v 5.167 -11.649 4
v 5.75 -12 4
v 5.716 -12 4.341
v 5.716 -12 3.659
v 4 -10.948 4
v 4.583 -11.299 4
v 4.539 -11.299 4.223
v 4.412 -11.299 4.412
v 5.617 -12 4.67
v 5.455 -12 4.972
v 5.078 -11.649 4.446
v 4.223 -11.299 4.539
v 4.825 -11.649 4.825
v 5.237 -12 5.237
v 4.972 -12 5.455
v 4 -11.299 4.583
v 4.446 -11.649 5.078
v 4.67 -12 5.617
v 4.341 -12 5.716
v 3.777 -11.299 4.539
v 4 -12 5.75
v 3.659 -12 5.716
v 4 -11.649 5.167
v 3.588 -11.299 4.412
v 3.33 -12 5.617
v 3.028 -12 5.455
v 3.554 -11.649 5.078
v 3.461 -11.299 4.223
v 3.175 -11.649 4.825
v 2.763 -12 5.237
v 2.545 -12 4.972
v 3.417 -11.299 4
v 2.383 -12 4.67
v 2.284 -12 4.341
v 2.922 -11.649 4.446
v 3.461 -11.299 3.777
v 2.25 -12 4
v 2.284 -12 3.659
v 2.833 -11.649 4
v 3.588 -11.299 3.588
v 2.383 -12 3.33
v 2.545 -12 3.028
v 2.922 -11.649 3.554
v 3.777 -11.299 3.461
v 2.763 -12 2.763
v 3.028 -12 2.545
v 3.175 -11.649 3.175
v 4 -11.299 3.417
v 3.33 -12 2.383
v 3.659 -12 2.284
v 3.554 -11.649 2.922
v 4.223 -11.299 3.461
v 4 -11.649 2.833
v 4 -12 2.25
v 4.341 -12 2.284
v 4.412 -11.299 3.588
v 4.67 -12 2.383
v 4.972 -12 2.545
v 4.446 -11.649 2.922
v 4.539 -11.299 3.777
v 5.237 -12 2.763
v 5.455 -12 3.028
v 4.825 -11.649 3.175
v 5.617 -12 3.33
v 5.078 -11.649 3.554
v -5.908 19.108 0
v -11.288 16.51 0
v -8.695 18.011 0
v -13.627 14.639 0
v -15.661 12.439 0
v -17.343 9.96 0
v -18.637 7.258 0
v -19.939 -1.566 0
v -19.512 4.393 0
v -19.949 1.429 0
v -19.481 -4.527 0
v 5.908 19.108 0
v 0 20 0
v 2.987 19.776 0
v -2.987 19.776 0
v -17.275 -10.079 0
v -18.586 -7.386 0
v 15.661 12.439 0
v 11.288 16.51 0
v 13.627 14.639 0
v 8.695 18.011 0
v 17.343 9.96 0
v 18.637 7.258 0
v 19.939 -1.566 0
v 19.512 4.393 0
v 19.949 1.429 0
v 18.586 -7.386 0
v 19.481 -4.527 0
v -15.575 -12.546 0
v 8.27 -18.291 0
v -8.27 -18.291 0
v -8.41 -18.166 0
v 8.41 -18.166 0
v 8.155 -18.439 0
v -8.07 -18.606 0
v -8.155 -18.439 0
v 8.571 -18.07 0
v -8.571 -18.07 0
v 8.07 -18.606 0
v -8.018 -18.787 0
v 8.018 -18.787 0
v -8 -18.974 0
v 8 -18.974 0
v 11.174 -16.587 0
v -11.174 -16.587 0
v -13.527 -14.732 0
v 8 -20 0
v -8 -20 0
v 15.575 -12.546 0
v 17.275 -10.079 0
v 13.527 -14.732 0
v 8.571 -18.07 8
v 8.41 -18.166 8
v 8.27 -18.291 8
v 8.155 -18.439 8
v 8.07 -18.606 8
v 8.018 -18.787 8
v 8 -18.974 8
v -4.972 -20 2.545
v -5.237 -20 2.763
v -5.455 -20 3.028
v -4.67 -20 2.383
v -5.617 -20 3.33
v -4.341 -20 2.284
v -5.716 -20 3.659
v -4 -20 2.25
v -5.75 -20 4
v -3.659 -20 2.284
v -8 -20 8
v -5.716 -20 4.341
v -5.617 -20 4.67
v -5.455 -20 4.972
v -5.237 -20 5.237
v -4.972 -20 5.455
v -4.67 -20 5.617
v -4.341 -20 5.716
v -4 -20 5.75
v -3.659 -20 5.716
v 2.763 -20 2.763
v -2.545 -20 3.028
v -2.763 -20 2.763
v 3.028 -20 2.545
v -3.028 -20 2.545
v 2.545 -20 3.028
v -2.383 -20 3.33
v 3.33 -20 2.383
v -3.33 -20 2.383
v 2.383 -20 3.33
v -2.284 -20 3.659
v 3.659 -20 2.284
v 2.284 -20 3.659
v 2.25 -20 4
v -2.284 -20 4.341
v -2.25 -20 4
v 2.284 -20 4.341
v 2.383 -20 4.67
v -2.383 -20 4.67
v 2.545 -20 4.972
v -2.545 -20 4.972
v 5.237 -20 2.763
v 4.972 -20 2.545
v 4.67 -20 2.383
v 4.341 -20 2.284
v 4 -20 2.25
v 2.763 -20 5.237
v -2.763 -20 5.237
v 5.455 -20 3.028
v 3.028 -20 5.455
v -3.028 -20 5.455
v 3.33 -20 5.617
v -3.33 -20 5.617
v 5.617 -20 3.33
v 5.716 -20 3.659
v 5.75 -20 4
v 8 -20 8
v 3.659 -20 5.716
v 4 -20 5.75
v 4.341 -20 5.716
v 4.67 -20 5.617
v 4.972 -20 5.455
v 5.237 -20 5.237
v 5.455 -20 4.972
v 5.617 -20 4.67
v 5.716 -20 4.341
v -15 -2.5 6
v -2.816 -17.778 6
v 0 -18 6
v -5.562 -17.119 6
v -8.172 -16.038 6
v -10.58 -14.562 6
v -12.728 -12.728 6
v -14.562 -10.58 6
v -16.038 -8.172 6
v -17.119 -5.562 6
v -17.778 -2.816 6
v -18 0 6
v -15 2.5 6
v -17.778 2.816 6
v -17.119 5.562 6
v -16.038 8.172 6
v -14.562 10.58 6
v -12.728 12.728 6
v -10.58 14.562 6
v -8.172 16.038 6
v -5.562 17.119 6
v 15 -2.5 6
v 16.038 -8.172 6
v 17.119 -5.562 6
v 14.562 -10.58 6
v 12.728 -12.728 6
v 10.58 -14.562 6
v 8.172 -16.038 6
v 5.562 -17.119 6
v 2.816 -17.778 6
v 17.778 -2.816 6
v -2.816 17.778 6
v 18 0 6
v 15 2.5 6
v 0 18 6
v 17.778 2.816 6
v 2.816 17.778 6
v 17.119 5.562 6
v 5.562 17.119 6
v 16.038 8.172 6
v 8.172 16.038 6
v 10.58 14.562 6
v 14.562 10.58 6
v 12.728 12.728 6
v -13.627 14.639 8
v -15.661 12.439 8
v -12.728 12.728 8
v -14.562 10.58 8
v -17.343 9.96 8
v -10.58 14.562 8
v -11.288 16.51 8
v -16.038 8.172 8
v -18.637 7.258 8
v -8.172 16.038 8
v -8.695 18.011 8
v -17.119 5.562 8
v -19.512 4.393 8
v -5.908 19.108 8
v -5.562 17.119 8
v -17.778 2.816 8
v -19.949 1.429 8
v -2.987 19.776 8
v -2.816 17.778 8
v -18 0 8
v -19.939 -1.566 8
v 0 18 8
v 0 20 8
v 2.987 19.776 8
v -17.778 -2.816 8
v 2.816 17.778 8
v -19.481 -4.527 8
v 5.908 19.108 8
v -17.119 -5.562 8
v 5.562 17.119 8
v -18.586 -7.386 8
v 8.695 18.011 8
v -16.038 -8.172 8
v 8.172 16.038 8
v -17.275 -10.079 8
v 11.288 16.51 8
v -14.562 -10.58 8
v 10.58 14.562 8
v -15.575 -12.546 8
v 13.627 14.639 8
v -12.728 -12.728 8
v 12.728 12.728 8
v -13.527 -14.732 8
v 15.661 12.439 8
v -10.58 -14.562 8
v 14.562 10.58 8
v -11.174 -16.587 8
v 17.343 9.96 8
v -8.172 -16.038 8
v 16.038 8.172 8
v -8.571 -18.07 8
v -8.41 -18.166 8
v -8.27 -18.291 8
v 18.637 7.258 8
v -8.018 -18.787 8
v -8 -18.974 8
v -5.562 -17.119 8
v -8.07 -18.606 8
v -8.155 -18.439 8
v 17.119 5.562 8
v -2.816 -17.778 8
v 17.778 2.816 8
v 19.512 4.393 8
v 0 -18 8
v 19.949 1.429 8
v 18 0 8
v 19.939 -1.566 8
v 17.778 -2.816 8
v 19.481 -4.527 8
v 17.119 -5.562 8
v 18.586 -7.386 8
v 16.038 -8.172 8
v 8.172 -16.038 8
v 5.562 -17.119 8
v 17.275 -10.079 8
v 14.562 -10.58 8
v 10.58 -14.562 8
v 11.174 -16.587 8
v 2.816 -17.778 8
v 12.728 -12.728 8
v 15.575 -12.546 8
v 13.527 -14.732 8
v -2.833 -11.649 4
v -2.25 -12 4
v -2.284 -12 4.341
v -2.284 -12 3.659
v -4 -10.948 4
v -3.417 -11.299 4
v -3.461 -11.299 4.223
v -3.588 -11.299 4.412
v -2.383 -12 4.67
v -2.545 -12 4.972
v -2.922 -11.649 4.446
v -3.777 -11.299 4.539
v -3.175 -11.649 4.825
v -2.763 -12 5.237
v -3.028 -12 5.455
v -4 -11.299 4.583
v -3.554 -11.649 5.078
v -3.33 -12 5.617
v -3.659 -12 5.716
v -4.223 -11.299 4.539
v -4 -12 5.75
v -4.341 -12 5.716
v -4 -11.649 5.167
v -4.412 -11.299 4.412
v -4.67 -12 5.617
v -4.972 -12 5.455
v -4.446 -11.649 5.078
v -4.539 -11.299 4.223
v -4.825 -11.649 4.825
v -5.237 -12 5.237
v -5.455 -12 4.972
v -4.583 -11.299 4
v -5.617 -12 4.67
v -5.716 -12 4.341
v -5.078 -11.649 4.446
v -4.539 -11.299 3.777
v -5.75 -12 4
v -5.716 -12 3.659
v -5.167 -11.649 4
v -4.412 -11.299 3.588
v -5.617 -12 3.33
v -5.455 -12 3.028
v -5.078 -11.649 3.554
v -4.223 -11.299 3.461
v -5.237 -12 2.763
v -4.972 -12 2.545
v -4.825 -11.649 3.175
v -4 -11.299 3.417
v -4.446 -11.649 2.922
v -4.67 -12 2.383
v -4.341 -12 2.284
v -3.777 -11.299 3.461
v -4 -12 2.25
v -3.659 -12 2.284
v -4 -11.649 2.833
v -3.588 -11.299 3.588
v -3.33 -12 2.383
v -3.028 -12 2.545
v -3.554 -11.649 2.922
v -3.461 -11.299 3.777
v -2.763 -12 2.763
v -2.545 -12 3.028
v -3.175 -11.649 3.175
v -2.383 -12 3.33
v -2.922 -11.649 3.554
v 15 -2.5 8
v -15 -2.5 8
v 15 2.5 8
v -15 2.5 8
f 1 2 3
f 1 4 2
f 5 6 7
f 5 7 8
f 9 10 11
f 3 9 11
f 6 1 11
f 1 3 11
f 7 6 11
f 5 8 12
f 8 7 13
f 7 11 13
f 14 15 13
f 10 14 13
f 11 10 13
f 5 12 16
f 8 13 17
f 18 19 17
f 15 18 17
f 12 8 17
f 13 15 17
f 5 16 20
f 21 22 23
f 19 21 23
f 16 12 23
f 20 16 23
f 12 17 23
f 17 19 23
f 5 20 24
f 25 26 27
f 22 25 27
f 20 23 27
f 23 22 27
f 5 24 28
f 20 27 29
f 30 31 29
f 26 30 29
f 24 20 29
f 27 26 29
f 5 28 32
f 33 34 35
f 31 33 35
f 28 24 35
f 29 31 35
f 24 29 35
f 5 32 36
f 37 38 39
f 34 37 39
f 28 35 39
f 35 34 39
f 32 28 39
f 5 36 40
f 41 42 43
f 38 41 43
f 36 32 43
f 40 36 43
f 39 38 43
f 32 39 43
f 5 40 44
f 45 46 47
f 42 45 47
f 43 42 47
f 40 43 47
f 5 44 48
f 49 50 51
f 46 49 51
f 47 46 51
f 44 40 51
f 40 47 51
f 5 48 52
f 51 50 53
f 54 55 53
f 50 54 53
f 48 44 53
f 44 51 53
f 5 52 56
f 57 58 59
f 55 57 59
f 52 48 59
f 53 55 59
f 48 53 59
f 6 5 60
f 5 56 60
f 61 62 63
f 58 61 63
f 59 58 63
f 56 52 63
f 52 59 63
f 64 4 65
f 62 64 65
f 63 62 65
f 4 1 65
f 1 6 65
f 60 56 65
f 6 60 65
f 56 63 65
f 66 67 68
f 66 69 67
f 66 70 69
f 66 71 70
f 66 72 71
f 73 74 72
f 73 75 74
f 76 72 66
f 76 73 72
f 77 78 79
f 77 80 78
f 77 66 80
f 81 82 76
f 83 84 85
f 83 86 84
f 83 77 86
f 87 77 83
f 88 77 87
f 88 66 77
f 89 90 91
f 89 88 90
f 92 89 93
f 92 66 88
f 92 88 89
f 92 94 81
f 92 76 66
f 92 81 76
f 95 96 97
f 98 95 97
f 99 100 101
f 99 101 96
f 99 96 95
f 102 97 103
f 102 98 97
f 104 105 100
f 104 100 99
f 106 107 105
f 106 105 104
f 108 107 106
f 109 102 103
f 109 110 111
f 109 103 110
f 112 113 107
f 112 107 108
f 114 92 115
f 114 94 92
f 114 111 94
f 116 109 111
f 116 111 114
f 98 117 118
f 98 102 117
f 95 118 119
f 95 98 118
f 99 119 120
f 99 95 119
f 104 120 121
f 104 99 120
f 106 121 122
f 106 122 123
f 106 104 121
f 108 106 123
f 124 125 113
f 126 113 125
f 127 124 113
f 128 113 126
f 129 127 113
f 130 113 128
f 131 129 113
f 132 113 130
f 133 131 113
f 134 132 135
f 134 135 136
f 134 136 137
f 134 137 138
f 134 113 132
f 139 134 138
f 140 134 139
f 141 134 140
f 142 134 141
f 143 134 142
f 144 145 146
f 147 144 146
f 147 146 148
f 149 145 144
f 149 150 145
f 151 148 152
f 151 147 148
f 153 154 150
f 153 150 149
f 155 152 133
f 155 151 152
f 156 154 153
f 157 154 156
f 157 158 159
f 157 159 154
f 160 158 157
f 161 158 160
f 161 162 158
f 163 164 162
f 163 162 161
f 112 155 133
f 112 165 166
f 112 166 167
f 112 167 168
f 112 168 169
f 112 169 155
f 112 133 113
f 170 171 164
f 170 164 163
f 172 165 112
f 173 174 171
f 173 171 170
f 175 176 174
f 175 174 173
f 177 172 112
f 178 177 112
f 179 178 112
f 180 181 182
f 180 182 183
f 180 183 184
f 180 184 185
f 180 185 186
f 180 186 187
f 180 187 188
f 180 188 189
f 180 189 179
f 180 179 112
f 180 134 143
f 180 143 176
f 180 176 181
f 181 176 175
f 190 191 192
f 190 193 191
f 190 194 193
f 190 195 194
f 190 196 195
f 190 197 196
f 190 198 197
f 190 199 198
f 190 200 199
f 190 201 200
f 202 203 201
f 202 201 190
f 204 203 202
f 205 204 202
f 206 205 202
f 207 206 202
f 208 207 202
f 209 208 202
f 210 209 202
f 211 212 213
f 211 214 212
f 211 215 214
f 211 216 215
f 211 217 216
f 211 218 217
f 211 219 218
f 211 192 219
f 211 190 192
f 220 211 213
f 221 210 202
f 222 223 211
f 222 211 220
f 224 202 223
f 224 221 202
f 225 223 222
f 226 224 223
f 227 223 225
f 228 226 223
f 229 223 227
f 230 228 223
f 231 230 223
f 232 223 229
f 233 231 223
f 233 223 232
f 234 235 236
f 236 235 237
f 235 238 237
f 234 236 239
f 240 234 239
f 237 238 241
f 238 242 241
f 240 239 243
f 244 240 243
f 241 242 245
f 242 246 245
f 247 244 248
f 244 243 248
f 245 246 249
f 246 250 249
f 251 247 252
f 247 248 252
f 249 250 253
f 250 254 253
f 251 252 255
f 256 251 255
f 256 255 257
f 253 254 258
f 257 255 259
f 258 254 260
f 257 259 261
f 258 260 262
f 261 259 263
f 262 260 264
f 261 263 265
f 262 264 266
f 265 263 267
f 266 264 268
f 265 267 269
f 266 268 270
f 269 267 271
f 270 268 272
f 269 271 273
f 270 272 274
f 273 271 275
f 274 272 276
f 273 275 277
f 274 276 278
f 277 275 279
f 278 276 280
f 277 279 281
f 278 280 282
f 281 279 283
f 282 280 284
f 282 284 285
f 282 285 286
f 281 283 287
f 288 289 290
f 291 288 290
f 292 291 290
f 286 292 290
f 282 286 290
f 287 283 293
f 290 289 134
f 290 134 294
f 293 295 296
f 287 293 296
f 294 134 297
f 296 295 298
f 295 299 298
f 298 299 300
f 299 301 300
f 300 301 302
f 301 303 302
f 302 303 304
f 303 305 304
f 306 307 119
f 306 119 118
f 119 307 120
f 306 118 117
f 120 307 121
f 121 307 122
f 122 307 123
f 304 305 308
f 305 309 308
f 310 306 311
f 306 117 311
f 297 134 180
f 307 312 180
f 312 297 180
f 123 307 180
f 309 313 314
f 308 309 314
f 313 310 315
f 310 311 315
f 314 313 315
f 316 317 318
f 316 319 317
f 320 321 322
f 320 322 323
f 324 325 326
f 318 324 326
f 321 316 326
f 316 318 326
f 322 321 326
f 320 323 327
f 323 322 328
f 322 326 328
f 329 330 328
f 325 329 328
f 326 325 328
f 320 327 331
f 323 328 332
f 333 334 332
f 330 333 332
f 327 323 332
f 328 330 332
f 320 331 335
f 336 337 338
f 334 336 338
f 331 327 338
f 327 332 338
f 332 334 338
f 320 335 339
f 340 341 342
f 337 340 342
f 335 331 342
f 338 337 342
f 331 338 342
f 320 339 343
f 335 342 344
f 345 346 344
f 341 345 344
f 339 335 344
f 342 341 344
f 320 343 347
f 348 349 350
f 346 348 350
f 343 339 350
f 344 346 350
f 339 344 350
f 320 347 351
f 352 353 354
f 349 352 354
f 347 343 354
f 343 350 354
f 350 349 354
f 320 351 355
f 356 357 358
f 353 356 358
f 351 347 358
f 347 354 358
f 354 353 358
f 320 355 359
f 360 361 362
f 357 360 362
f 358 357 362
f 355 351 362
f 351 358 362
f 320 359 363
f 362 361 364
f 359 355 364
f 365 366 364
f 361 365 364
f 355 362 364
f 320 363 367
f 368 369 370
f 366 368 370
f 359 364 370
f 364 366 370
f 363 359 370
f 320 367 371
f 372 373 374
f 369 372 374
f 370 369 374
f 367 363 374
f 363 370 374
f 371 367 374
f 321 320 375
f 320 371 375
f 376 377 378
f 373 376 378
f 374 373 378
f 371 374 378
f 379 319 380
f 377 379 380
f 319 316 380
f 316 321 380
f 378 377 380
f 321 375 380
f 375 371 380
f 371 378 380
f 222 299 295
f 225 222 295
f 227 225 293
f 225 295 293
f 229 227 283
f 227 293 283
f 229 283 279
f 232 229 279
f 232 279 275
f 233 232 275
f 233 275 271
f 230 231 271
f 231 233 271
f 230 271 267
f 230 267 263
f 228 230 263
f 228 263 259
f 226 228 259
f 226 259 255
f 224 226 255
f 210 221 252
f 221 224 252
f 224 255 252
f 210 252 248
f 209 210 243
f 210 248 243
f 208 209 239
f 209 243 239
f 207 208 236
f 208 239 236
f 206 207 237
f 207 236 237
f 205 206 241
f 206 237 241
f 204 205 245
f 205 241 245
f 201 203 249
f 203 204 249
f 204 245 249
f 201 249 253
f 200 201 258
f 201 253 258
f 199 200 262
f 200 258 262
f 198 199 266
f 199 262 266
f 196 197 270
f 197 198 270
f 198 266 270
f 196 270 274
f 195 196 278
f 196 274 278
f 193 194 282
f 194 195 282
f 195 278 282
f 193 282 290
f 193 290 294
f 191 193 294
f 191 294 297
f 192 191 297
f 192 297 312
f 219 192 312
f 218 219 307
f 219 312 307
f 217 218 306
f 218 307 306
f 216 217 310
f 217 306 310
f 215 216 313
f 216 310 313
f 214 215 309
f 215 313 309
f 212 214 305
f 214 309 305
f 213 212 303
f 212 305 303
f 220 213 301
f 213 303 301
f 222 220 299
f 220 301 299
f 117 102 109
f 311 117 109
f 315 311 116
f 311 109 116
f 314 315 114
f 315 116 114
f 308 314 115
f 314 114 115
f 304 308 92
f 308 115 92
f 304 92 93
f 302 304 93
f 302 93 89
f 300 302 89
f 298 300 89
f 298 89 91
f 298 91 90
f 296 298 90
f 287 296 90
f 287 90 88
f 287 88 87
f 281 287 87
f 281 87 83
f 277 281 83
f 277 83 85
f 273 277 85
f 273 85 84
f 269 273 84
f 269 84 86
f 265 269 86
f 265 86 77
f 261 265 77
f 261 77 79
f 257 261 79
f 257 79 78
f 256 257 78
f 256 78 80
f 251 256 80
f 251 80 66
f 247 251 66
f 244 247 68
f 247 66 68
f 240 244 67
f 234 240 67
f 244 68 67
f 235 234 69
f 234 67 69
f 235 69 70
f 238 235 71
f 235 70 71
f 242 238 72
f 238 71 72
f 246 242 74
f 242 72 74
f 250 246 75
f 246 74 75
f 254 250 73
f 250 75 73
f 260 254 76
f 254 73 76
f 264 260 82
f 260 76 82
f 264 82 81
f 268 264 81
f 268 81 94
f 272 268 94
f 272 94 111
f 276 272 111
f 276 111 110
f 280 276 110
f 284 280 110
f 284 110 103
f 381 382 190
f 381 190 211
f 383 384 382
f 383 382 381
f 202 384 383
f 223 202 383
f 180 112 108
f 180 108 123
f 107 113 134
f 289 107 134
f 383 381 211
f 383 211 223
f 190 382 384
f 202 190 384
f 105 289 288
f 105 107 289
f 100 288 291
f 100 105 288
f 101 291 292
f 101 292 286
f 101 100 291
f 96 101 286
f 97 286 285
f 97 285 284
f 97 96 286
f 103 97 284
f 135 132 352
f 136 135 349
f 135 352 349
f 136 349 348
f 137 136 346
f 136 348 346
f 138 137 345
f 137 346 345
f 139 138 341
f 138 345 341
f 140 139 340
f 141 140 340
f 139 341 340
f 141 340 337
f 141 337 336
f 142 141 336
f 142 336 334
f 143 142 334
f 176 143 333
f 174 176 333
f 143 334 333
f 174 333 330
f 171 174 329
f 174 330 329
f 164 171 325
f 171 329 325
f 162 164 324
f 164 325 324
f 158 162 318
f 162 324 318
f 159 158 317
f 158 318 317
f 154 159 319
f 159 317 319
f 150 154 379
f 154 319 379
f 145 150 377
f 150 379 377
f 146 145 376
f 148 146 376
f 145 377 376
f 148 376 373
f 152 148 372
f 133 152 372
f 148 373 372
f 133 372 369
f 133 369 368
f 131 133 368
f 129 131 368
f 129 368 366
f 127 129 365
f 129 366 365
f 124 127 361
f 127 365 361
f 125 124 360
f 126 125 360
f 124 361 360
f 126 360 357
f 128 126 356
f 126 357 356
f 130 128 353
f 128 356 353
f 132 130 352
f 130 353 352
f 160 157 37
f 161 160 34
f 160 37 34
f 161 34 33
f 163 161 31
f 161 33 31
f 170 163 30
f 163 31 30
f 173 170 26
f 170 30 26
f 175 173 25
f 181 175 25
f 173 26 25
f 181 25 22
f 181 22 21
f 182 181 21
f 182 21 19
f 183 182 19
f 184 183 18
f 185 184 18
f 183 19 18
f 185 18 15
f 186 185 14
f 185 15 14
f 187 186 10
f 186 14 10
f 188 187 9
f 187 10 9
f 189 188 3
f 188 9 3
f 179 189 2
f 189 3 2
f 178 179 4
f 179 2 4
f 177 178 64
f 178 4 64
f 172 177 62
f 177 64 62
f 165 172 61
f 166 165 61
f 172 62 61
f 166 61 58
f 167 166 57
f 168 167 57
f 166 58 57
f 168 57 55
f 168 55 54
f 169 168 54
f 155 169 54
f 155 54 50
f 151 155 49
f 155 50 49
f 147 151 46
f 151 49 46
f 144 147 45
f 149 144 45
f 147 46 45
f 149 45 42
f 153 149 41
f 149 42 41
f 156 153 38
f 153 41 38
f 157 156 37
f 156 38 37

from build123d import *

# Parameters (mm, degrees)
F0_R          = 20
F1_DEPTH      = 8
F2_R          = 18
F2_W          = 30
F2_H          = 5
F3_DEPTH      = 2
F6_END_RADIUS = 18
F5_W          = 16
F5_H          = 8
F6_REACH      = 57.88954382
F7_D          = 3.5
F7_DEPTH      = 8
F7_TIP        = 1.0515060833
F8_R          = 1


with BuildPart() as f1:
    # F0 (on Top) → F1 (new body)
    with BuildSketch(Plane.XY):
        Circle(F0_R)
    extrude(amount=F1_DEPTH)

    # F2 (on face) → F3 (cut)
    with BuildSketch(Plane.XY.offset(8)):
        Circle(F2_R)
        Rectangle(F2_W, F2_H, mode=Mode.SUBTRACT)
    extrude(amount=-F3_DEPTH, mode=Mode.SUBTRACT)

    f6_end = (Plane.XY.offset(7) * Cylinder(F6_END_RADIUS, 230.0419424967, mode=Mode.PRIVATE)).faces().sort_by_distance((-18, 0, 7))[0]
    # F5 (on offset) → F6 (join, up to the whole of a round face its end follows)
    with BuildSketch(Plane.XZ.offset(20)):
        with Locations((0, 4)):
            Rectangle(F5_W, F5_H)
    f6_long = extrude(amount=-F6_REACH, mode=Mode.PRIVATE)
    add(split(f6_long, bisect_by=f6_end, keep=Keep.ALL, mode=Mode.PRIVATE).solids().sort_by_distance((0, -20, 4))[0])

    # F7
    with Locations(Plane.XZ.offset(20)):
        with Locations((4, 4), (-4, 4)):
            Hole(F7_D / 2, depth=F7_DEPTH)
            with Locations((0, 0, -(F7_DEPTH + F7_TIP / 2))):  # 118° drill point
                Cone(0, F7_D / 2, F7_TIP, mode=Mode.SUBTRACT)

    # F8
    f8_edges = [f1.edges().sort_by_distance(p)[0] for p in [
        (8, -18.330303, 4),
        (-8, -18.330303, 4),
    ]]
    fillet(f8_edges, radius=F8_R)


solid = f1.part
